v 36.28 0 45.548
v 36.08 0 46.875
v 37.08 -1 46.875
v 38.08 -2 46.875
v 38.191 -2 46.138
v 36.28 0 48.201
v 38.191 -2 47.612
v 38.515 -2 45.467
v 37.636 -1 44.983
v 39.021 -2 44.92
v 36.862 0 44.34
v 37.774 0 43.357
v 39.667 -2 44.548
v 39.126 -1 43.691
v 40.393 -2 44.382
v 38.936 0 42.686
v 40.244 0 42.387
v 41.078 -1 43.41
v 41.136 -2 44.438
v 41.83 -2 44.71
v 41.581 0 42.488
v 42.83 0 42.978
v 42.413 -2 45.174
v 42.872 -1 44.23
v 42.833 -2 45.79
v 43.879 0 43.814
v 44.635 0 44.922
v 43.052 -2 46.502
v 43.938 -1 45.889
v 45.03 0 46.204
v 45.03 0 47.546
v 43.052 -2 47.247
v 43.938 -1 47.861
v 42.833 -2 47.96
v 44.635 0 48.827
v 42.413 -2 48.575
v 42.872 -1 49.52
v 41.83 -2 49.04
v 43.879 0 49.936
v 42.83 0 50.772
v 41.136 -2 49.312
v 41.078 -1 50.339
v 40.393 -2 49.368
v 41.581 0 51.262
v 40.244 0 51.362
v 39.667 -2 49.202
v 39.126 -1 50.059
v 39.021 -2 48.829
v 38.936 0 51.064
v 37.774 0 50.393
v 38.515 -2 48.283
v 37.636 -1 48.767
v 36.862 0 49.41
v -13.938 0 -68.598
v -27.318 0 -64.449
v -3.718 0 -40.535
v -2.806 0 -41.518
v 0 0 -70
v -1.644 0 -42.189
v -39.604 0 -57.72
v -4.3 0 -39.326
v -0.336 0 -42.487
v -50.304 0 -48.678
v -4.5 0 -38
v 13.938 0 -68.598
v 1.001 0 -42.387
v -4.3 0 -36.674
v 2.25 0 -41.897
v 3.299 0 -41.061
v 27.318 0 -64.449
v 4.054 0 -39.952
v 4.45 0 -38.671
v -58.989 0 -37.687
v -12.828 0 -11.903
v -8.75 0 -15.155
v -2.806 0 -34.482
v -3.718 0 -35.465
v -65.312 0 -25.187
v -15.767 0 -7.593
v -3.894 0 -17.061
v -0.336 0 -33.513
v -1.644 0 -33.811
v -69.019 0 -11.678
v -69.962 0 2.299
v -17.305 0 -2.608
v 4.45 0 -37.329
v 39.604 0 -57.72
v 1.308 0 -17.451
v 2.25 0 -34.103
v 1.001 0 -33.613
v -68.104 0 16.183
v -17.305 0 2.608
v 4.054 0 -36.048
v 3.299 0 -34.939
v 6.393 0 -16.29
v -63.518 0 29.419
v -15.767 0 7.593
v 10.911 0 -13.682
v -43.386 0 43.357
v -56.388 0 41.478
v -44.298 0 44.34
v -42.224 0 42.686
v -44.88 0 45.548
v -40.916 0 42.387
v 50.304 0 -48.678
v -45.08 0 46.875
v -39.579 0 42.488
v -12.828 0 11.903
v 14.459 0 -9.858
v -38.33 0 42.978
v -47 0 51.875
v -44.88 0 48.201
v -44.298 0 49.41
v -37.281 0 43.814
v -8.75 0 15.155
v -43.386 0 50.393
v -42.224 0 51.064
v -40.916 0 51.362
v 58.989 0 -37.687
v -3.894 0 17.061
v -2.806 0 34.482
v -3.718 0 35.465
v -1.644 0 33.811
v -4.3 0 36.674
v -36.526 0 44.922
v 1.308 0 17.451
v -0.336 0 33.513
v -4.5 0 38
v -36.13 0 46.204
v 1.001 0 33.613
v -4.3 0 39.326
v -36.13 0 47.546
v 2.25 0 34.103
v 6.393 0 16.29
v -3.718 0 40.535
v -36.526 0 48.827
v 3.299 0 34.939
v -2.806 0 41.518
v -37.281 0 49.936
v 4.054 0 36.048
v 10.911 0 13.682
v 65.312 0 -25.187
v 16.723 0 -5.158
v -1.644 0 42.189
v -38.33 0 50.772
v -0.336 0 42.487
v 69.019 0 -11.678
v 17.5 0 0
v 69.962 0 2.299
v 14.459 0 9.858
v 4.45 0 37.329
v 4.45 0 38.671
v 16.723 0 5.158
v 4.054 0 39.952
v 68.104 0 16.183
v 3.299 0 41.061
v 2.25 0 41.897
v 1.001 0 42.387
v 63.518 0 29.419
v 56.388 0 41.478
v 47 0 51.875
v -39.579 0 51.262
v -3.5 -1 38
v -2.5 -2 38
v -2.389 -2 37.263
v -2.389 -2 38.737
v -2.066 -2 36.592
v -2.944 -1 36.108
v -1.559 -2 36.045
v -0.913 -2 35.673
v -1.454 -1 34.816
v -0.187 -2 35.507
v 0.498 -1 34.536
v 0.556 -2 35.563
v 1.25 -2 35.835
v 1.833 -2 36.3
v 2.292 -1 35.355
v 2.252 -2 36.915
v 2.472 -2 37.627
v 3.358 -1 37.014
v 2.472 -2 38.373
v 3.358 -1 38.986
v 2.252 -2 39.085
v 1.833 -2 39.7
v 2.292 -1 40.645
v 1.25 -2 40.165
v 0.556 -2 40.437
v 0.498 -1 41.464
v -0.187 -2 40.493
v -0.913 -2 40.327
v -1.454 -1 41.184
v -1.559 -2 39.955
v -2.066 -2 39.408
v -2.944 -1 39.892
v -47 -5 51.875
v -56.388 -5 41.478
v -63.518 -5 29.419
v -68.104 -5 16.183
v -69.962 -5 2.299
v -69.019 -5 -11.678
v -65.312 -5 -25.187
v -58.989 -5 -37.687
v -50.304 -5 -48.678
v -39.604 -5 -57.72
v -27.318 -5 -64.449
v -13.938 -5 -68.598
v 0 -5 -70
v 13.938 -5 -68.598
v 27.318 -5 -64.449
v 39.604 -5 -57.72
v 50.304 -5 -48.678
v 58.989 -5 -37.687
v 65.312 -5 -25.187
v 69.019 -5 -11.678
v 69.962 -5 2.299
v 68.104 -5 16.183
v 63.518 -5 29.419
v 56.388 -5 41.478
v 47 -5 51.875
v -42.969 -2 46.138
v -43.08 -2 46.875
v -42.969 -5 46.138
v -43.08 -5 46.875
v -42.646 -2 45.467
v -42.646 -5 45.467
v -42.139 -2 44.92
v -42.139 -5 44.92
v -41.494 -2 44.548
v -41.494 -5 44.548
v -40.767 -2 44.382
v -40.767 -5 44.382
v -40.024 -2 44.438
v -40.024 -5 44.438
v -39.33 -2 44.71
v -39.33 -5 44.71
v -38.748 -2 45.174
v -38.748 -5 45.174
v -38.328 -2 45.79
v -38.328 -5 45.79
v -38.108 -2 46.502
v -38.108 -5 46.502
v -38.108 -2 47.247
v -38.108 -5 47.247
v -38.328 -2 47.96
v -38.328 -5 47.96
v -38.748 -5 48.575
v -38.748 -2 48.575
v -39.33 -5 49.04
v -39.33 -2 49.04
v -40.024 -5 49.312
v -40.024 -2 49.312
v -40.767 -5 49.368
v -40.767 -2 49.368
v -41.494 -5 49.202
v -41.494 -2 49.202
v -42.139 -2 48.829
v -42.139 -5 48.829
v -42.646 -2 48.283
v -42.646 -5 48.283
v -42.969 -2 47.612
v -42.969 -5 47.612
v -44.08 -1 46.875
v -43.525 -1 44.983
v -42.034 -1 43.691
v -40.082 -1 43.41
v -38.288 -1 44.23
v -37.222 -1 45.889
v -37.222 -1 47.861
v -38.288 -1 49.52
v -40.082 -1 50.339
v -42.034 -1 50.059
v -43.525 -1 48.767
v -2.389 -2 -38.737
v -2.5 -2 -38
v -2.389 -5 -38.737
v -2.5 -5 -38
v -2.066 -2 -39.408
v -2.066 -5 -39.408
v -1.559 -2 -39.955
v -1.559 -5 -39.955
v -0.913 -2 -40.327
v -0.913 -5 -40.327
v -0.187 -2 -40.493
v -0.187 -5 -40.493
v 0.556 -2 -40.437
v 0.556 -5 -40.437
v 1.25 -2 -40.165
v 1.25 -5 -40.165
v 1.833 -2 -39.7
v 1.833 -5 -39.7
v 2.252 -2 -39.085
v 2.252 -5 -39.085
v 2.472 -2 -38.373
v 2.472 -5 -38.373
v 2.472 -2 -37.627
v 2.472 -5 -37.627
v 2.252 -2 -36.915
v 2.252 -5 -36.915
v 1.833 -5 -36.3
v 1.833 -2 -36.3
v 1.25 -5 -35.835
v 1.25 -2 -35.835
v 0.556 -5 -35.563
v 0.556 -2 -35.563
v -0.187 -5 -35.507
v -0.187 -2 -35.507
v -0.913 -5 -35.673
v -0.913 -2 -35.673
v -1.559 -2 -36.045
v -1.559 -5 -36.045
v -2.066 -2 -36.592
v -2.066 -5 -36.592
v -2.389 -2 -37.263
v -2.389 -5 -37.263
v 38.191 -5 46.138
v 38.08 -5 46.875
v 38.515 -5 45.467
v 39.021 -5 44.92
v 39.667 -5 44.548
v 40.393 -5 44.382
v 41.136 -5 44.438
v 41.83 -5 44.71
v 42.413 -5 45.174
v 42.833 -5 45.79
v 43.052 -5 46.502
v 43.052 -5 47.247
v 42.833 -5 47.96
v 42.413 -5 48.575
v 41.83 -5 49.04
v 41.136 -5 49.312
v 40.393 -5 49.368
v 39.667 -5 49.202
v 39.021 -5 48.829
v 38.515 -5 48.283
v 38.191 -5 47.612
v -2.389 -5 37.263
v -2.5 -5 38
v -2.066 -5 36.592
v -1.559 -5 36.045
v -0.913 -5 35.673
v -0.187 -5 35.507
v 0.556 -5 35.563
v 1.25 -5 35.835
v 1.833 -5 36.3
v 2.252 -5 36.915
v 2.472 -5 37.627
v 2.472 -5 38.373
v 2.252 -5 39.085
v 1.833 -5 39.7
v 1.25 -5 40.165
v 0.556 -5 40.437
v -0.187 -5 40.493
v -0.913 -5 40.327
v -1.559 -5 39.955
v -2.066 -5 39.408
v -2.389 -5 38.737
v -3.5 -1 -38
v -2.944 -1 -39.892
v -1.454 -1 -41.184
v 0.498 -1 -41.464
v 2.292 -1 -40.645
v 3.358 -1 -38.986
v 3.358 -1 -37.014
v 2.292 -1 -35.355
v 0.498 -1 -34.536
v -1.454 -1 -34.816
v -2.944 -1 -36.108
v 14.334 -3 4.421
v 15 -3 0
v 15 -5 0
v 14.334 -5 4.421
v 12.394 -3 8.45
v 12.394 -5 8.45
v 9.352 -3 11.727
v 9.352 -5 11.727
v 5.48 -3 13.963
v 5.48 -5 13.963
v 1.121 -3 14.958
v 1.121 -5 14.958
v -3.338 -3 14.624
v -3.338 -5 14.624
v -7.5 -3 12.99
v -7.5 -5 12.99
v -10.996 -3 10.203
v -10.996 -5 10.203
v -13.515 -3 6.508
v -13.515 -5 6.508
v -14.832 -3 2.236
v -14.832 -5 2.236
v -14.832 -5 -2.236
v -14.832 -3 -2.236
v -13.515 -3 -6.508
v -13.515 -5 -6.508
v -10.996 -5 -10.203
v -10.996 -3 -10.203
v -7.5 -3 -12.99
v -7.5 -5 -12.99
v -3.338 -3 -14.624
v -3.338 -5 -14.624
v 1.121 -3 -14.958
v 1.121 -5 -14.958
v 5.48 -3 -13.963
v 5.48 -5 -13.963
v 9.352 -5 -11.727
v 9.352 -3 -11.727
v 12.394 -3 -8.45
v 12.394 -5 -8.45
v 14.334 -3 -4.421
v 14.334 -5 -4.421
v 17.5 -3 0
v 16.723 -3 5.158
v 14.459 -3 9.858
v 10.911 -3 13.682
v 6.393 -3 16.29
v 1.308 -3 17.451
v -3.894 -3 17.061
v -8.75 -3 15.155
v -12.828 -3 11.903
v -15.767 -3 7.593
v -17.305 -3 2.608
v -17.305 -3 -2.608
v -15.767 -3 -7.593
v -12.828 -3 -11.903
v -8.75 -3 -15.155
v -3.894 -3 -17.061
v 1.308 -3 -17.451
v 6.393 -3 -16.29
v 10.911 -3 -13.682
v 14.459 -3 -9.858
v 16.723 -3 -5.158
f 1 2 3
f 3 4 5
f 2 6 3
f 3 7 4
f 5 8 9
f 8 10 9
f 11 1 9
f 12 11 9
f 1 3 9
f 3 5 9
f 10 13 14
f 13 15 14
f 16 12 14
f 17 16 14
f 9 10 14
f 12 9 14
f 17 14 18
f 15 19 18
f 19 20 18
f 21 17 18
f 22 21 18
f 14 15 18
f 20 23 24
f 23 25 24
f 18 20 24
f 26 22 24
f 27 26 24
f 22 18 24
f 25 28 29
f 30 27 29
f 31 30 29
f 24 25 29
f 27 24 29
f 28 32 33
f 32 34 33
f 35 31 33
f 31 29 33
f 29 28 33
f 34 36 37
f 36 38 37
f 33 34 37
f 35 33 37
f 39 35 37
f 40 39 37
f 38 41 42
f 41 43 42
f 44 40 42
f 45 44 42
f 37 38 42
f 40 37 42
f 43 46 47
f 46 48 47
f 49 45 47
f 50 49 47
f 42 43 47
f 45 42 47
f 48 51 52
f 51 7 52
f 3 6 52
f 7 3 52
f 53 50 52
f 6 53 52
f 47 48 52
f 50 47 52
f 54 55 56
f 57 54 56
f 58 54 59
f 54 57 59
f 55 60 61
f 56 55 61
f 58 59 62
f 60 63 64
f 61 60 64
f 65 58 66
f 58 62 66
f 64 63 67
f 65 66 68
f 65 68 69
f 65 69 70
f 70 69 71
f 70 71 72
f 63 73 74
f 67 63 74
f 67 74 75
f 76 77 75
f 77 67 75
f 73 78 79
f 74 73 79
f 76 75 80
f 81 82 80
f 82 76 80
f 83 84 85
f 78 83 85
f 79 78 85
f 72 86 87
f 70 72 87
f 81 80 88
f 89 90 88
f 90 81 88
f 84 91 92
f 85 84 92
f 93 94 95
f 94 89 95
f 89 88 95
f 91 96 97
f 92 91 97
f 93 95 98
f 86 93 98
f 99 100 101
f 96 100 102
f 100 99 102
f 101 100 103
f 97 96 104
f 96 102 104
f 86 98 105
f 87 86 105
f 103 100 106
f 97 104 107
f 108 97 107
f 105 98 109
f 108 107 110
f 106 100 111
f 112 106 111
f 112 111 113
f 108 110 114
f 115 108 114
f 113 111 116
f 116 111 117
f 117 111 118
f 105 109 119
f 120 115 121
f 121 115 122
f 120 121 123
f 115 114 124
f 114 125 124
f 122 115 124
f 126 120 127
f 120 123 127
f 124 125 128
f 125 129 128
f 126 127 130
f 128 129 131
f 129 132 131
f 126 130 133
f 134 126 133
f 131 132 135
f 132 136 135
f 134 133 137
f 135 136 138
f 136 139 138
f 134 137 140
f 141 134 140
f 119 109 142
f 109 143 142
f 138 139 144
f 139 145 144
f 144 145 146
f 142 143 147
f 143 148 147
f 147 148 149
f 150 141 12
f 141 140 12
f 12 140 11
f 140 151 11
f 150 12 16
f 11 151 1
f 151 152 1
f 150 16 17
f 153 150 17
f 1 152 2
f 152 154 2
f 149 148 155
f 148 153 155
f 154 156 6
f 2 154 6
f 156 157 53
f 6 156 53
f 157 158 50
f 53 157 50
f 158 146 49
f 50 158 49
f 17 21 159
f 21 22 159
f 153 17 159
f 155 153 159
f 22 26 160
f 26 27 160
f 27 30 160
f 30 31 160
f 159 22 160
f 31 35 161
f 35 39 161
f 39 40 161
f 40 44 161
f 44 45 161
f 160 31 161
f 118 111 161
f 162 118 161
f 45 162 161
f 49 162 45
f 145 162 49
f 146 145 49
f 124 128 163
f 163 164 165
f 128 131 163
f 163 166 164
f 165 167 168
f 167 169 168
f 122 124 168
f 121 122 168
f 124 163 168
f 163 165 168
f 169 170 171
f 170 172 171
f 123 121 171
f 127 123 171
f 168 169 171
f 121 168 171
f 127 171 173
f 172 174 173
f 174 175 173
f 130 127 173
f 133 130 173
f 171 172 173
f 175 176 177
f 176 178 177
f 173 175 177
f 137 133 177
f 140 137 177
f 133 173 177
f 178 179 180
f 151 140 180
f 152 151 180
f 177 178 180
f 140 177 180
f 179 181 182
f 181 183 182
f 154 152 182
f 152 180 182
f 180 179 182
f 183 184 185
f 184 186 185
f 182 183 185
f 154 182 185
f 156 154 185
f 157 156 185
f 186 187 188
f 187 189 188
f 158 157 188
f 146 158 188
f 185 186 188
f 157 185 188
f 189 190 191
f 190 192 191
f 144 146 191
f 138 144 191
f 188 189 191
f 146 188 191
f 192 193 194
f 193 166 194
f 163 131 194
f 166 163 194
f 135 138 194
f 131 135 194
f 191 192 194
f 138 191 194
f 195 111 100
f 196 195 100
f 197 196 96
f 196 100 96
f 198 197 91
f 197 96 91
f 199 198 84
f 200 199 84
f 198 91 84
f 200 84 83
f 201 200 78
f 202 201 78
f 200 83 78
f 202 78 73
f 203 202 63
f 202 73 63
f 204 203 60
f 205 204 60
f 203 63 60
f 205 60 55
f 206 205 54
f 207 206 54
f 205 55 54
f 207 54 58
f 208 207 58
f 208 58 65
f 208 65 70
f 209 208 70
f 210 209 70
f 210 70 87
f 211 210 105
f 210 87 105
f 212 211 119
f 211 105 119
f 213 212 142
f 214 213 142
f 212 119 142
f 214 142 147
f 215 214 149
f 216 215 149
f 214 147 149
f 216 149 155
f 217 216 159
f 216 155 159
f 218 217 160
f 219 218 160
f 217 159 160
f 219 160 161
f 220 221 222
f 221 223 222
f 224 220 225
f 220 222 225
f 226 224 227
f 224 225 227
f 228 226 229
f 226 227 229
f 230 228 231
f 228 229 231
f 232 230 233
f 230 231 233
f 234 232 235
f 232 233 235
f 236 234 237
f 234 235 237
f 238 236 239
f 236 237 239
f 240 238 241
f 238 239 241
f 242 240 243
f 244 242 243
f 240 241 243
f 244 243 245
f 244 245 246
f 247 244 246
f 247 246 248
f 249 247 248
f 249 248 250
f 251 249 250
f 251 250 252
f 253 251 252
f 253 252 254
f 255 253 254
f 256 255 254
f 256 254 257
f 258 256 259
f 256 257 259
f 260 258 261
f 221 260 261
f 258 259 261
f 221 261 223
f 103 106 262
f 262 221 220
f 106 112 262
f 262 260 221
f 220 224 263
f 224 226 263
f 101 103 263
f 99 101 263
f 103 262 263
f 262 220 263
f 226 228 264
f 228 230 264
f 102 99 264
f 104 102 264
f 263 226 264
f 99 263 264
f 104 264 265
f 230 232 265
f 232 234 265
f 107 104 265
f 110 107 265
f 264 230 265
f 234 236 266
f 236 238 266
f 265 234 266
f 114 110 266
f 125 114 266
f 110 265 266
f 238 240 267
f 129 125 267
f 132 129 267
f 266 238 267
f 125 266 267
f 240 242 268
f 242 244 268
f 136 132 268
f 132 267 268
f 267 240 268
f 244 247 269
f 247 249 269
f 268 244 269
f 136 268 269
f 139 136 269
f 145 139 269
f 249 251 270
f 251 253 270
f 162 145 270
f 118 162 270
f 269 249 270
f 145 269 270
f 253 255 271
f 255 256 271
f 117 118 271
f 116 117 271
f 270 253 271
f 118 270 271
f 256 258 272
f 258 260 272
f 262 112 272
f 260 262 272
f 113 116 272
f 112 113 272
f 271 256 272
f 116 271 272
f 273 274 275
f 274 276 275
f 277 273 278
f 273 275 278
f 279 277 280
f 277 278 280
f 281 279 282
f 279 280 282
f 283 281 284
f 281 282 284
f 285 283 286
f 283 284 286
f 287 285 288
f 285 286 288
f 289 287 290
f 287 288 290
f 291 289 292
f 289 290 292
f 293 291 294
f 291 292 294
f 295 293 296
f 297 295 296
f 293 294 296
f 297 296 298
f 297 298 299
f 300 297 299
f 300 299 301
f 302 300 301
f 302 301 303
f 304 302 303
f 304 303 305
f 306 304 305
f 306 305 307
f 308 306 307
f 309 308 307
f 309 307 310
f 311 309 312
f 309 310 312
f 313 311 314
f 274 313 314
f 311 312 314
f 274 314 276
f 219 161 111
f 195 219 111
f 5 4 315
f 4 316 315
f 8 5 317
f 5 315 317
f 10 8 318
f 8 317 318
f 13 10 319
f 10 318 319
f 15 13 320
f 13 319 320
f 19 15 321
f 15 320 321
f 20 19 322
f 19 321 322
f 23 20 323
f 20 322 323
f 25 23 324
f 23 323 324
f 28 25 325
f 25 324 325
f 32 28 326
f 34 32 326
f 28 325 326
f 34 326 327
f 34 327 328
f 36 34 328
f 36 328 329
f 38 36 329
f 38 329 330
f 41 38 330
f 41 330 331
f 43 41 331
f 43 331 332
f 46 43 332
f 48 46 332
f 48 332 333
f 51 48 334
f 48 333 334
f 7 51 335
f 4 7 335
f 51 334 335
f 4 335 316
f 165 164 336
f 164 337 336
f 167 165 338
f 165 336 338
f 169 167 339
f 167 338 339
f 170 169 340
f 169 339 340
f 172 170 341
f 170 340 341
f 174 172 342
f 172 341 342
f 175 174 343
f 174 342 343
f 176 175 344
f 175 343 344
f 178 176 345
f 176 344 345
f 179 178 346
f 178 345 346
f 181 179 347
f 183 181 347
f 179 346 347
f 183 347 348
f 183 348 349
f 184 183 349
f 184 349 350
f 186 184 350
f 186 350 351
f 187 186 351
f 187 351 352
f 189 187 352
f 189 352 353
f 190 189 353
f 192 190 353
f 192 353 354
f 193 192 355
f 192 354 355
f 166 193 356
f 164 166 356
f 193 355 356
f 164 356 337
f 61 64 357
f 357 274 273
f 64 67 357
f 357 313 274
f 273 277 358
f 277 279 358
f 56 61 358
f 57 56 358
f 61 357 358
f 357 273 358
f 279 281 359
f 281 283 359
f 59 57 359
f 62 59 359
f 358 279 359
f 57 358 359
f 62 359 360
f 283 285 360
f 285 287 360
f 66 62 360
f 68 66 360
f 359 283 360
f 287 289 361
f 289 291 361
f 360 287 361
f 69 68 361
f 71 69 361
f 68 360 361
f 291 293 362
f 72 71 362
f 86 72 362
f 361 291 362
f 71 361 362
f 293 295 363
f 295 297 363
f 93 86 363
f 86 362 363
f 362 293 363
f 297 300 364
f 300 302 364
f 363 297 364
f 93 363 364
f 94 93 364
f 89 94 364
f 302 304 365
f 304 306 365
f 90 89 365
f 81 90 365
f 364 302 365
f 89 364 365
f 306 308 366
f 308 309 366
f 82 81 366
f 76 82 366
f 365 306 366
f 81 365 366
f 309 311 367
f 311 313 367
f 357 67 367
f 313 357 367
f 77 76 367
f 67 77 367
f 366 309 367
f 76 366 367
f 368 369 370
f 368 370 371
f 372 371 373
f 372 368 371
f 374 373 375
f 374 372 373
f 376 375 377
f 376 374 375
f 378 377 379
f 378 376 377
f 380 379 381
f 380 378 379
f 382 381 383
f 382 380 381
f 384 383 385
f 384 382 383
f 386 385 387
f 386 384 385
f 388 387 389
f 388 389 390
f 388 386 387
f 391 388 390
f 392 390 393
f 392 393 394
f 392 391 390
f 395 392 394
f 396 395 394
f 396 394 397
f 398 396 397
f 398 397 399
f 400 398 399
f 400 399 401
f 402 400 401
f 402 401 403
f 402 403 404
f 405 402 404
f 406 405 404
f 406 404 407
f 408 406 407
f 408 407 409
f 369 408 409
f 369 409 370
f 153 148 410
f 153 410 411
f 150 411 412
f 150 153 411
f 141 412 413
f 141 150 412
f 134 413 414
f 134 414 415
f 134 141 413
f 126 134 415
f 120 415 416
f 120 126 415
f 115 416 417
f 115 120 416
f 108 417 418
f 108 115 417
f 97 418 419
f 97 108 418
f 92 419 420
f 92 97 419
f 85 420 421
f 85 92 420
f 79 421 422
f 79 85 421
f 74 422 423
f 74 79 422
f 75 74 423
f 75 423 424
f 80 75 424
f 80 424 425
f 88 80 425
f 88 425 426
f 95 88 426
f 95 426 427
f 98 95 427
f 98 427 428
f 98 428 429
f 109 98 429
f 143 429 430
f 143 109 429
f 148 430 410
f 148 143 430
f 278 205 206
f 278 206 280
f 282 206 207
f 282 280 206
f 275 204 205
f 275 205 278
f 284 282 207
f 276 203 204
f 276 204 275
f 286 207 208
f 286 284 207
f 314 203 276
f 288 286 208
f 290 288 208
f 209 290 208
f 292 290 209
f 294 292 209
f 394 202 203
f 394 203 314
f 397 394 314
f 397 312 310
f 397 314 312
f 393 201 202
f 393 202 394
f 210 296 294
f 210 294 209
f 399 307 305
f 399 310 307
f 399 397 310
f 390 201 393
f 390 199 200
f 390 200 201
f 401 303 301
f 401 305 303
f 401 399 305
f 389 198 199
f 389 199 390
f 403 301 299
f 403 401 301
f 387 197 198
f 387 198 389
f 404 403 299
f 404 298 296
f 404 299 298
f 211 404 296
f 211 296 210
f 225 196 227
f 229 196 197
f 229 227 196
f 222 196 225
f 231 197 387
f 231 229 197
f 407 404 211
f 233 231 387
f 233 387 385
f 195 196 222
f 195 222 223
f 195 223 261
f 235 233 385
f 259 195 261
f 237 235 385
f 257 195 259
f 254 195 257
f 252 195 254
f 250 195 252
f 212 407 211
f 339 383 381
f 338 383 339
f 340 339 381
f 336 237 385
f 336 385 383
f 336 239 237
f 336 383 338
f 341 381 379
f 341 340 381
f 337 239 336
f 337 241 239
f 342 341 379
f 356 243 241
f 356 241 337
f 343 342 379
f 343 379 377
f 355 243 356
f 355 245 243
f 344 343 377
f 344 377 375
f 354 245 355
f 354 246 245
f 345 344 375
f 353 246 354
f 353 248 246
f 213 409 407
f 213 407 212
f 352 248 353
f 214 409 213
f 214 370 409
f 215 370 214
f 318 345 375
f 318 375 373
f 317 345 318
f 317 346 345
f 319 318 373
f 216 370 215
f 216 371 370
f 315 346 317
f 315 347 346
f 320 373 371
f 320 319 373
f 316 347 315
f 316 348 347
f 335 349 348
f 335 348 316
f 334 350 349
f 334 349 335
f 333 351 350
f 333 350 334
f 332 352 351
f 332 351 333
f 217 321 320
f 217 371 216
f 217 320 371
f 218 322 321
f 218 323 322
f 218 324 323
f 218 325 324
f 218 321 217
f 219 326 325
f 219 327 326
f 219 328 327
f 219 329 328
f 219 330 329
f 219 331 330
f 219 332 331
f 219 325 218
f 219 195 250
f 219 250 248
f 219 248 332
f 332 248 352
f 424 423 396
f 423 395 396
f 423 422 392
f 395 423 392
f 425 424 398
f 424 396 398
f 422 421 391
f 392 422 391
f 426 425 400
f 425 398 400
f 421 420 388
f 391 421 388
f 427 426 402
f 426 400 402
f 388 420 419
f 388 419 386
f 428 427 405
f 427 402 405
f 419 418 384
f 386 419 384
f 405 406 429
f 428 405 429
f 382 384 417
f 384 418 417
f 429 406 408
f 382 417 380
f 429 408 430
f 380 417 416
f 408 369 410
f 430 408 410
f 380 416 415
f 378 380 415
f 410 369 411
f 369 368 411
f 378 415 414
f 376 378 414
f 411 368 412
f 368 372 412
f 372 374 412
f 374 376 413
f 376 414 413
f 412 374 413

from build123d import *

# Parameters (mm, degrees)
F2_R           = 2.5
F2_R_2         = 17.5
F2_R_3         = 15
F3_DEPTH       = 5
F4_DEPTH       = 3
F5_D           = 5
F5_CSINK_D     = 9
F5_CSINK_ANGLE = 90


with BuildPart() as f3:
    # F2 (on Front) → F3 (new body)
    with BuildSketch(Plane.XZ):
        with BuildLine():
            Line((47, 51.8748493974), (-47, 51.8748493974))
            ThreePointArc((-47, 51.8748493974), (0, -70), (47, 51.8748493974))
        make_face()
        with Locations((0, -38)):
            Circle(F2_R, mode=Mode.SUBTRACT)
        with Locations((-40.5801490137, 46.8748493974)):
            Circle(F2_R, mode=Mode.SUBTRACT)
        Circle(F2_R_2, mode=Mode.SUBTRACT)
        with Locations((0, 38)):
            Circle(F2_R, mode=Mode.SUBTRACT)
        with Locations((40.5801490137, 46.8748493974)):
            Circle(F2_R, mode=Mode.SUBTRACT)
        with Locations((40.5801490137, 46.8748493974)):
            Circle(F2_R)
        with Locations((0, 38)):
            Circle(F2_R)
        with Locations((-40.5801490137, 46.8748493974)):
            Circle(F2_R)
        with Locations((0, -38)):
            Circle(F2_R)
        Circle(F2_R_2)
        Circle(F2_R_3, mode=Mode.SUBTRACT)
    extrude(amount=F3_DEPTH)

    # F2 (on Front) → F4 (cut)
    with BuildSketch(Plane.XZ):
        Circle(F2_R_2)
        Circle(F2_R_3, mode=Mode.SUBTRACT)
    extrude(amount=F4_DEPTH, mode=Mode.SUBTRACT)

    # F5 (through all)
    with Locations(Plane(origin=(0, 0, 0), x_dir=(1, 0, 0), z_dir=(0, 1, 0))):
        with Locations((-40.5801490137, -46.8748493974), (0, -38), (40.5801490137, -46.8748493974), (0, 38)):
            CounterSinkHole(F5_D / 2, F5_CSINK_D / 2, counter_sink_angle=F5_CSINK_ANGLE)


solid = f3.part
